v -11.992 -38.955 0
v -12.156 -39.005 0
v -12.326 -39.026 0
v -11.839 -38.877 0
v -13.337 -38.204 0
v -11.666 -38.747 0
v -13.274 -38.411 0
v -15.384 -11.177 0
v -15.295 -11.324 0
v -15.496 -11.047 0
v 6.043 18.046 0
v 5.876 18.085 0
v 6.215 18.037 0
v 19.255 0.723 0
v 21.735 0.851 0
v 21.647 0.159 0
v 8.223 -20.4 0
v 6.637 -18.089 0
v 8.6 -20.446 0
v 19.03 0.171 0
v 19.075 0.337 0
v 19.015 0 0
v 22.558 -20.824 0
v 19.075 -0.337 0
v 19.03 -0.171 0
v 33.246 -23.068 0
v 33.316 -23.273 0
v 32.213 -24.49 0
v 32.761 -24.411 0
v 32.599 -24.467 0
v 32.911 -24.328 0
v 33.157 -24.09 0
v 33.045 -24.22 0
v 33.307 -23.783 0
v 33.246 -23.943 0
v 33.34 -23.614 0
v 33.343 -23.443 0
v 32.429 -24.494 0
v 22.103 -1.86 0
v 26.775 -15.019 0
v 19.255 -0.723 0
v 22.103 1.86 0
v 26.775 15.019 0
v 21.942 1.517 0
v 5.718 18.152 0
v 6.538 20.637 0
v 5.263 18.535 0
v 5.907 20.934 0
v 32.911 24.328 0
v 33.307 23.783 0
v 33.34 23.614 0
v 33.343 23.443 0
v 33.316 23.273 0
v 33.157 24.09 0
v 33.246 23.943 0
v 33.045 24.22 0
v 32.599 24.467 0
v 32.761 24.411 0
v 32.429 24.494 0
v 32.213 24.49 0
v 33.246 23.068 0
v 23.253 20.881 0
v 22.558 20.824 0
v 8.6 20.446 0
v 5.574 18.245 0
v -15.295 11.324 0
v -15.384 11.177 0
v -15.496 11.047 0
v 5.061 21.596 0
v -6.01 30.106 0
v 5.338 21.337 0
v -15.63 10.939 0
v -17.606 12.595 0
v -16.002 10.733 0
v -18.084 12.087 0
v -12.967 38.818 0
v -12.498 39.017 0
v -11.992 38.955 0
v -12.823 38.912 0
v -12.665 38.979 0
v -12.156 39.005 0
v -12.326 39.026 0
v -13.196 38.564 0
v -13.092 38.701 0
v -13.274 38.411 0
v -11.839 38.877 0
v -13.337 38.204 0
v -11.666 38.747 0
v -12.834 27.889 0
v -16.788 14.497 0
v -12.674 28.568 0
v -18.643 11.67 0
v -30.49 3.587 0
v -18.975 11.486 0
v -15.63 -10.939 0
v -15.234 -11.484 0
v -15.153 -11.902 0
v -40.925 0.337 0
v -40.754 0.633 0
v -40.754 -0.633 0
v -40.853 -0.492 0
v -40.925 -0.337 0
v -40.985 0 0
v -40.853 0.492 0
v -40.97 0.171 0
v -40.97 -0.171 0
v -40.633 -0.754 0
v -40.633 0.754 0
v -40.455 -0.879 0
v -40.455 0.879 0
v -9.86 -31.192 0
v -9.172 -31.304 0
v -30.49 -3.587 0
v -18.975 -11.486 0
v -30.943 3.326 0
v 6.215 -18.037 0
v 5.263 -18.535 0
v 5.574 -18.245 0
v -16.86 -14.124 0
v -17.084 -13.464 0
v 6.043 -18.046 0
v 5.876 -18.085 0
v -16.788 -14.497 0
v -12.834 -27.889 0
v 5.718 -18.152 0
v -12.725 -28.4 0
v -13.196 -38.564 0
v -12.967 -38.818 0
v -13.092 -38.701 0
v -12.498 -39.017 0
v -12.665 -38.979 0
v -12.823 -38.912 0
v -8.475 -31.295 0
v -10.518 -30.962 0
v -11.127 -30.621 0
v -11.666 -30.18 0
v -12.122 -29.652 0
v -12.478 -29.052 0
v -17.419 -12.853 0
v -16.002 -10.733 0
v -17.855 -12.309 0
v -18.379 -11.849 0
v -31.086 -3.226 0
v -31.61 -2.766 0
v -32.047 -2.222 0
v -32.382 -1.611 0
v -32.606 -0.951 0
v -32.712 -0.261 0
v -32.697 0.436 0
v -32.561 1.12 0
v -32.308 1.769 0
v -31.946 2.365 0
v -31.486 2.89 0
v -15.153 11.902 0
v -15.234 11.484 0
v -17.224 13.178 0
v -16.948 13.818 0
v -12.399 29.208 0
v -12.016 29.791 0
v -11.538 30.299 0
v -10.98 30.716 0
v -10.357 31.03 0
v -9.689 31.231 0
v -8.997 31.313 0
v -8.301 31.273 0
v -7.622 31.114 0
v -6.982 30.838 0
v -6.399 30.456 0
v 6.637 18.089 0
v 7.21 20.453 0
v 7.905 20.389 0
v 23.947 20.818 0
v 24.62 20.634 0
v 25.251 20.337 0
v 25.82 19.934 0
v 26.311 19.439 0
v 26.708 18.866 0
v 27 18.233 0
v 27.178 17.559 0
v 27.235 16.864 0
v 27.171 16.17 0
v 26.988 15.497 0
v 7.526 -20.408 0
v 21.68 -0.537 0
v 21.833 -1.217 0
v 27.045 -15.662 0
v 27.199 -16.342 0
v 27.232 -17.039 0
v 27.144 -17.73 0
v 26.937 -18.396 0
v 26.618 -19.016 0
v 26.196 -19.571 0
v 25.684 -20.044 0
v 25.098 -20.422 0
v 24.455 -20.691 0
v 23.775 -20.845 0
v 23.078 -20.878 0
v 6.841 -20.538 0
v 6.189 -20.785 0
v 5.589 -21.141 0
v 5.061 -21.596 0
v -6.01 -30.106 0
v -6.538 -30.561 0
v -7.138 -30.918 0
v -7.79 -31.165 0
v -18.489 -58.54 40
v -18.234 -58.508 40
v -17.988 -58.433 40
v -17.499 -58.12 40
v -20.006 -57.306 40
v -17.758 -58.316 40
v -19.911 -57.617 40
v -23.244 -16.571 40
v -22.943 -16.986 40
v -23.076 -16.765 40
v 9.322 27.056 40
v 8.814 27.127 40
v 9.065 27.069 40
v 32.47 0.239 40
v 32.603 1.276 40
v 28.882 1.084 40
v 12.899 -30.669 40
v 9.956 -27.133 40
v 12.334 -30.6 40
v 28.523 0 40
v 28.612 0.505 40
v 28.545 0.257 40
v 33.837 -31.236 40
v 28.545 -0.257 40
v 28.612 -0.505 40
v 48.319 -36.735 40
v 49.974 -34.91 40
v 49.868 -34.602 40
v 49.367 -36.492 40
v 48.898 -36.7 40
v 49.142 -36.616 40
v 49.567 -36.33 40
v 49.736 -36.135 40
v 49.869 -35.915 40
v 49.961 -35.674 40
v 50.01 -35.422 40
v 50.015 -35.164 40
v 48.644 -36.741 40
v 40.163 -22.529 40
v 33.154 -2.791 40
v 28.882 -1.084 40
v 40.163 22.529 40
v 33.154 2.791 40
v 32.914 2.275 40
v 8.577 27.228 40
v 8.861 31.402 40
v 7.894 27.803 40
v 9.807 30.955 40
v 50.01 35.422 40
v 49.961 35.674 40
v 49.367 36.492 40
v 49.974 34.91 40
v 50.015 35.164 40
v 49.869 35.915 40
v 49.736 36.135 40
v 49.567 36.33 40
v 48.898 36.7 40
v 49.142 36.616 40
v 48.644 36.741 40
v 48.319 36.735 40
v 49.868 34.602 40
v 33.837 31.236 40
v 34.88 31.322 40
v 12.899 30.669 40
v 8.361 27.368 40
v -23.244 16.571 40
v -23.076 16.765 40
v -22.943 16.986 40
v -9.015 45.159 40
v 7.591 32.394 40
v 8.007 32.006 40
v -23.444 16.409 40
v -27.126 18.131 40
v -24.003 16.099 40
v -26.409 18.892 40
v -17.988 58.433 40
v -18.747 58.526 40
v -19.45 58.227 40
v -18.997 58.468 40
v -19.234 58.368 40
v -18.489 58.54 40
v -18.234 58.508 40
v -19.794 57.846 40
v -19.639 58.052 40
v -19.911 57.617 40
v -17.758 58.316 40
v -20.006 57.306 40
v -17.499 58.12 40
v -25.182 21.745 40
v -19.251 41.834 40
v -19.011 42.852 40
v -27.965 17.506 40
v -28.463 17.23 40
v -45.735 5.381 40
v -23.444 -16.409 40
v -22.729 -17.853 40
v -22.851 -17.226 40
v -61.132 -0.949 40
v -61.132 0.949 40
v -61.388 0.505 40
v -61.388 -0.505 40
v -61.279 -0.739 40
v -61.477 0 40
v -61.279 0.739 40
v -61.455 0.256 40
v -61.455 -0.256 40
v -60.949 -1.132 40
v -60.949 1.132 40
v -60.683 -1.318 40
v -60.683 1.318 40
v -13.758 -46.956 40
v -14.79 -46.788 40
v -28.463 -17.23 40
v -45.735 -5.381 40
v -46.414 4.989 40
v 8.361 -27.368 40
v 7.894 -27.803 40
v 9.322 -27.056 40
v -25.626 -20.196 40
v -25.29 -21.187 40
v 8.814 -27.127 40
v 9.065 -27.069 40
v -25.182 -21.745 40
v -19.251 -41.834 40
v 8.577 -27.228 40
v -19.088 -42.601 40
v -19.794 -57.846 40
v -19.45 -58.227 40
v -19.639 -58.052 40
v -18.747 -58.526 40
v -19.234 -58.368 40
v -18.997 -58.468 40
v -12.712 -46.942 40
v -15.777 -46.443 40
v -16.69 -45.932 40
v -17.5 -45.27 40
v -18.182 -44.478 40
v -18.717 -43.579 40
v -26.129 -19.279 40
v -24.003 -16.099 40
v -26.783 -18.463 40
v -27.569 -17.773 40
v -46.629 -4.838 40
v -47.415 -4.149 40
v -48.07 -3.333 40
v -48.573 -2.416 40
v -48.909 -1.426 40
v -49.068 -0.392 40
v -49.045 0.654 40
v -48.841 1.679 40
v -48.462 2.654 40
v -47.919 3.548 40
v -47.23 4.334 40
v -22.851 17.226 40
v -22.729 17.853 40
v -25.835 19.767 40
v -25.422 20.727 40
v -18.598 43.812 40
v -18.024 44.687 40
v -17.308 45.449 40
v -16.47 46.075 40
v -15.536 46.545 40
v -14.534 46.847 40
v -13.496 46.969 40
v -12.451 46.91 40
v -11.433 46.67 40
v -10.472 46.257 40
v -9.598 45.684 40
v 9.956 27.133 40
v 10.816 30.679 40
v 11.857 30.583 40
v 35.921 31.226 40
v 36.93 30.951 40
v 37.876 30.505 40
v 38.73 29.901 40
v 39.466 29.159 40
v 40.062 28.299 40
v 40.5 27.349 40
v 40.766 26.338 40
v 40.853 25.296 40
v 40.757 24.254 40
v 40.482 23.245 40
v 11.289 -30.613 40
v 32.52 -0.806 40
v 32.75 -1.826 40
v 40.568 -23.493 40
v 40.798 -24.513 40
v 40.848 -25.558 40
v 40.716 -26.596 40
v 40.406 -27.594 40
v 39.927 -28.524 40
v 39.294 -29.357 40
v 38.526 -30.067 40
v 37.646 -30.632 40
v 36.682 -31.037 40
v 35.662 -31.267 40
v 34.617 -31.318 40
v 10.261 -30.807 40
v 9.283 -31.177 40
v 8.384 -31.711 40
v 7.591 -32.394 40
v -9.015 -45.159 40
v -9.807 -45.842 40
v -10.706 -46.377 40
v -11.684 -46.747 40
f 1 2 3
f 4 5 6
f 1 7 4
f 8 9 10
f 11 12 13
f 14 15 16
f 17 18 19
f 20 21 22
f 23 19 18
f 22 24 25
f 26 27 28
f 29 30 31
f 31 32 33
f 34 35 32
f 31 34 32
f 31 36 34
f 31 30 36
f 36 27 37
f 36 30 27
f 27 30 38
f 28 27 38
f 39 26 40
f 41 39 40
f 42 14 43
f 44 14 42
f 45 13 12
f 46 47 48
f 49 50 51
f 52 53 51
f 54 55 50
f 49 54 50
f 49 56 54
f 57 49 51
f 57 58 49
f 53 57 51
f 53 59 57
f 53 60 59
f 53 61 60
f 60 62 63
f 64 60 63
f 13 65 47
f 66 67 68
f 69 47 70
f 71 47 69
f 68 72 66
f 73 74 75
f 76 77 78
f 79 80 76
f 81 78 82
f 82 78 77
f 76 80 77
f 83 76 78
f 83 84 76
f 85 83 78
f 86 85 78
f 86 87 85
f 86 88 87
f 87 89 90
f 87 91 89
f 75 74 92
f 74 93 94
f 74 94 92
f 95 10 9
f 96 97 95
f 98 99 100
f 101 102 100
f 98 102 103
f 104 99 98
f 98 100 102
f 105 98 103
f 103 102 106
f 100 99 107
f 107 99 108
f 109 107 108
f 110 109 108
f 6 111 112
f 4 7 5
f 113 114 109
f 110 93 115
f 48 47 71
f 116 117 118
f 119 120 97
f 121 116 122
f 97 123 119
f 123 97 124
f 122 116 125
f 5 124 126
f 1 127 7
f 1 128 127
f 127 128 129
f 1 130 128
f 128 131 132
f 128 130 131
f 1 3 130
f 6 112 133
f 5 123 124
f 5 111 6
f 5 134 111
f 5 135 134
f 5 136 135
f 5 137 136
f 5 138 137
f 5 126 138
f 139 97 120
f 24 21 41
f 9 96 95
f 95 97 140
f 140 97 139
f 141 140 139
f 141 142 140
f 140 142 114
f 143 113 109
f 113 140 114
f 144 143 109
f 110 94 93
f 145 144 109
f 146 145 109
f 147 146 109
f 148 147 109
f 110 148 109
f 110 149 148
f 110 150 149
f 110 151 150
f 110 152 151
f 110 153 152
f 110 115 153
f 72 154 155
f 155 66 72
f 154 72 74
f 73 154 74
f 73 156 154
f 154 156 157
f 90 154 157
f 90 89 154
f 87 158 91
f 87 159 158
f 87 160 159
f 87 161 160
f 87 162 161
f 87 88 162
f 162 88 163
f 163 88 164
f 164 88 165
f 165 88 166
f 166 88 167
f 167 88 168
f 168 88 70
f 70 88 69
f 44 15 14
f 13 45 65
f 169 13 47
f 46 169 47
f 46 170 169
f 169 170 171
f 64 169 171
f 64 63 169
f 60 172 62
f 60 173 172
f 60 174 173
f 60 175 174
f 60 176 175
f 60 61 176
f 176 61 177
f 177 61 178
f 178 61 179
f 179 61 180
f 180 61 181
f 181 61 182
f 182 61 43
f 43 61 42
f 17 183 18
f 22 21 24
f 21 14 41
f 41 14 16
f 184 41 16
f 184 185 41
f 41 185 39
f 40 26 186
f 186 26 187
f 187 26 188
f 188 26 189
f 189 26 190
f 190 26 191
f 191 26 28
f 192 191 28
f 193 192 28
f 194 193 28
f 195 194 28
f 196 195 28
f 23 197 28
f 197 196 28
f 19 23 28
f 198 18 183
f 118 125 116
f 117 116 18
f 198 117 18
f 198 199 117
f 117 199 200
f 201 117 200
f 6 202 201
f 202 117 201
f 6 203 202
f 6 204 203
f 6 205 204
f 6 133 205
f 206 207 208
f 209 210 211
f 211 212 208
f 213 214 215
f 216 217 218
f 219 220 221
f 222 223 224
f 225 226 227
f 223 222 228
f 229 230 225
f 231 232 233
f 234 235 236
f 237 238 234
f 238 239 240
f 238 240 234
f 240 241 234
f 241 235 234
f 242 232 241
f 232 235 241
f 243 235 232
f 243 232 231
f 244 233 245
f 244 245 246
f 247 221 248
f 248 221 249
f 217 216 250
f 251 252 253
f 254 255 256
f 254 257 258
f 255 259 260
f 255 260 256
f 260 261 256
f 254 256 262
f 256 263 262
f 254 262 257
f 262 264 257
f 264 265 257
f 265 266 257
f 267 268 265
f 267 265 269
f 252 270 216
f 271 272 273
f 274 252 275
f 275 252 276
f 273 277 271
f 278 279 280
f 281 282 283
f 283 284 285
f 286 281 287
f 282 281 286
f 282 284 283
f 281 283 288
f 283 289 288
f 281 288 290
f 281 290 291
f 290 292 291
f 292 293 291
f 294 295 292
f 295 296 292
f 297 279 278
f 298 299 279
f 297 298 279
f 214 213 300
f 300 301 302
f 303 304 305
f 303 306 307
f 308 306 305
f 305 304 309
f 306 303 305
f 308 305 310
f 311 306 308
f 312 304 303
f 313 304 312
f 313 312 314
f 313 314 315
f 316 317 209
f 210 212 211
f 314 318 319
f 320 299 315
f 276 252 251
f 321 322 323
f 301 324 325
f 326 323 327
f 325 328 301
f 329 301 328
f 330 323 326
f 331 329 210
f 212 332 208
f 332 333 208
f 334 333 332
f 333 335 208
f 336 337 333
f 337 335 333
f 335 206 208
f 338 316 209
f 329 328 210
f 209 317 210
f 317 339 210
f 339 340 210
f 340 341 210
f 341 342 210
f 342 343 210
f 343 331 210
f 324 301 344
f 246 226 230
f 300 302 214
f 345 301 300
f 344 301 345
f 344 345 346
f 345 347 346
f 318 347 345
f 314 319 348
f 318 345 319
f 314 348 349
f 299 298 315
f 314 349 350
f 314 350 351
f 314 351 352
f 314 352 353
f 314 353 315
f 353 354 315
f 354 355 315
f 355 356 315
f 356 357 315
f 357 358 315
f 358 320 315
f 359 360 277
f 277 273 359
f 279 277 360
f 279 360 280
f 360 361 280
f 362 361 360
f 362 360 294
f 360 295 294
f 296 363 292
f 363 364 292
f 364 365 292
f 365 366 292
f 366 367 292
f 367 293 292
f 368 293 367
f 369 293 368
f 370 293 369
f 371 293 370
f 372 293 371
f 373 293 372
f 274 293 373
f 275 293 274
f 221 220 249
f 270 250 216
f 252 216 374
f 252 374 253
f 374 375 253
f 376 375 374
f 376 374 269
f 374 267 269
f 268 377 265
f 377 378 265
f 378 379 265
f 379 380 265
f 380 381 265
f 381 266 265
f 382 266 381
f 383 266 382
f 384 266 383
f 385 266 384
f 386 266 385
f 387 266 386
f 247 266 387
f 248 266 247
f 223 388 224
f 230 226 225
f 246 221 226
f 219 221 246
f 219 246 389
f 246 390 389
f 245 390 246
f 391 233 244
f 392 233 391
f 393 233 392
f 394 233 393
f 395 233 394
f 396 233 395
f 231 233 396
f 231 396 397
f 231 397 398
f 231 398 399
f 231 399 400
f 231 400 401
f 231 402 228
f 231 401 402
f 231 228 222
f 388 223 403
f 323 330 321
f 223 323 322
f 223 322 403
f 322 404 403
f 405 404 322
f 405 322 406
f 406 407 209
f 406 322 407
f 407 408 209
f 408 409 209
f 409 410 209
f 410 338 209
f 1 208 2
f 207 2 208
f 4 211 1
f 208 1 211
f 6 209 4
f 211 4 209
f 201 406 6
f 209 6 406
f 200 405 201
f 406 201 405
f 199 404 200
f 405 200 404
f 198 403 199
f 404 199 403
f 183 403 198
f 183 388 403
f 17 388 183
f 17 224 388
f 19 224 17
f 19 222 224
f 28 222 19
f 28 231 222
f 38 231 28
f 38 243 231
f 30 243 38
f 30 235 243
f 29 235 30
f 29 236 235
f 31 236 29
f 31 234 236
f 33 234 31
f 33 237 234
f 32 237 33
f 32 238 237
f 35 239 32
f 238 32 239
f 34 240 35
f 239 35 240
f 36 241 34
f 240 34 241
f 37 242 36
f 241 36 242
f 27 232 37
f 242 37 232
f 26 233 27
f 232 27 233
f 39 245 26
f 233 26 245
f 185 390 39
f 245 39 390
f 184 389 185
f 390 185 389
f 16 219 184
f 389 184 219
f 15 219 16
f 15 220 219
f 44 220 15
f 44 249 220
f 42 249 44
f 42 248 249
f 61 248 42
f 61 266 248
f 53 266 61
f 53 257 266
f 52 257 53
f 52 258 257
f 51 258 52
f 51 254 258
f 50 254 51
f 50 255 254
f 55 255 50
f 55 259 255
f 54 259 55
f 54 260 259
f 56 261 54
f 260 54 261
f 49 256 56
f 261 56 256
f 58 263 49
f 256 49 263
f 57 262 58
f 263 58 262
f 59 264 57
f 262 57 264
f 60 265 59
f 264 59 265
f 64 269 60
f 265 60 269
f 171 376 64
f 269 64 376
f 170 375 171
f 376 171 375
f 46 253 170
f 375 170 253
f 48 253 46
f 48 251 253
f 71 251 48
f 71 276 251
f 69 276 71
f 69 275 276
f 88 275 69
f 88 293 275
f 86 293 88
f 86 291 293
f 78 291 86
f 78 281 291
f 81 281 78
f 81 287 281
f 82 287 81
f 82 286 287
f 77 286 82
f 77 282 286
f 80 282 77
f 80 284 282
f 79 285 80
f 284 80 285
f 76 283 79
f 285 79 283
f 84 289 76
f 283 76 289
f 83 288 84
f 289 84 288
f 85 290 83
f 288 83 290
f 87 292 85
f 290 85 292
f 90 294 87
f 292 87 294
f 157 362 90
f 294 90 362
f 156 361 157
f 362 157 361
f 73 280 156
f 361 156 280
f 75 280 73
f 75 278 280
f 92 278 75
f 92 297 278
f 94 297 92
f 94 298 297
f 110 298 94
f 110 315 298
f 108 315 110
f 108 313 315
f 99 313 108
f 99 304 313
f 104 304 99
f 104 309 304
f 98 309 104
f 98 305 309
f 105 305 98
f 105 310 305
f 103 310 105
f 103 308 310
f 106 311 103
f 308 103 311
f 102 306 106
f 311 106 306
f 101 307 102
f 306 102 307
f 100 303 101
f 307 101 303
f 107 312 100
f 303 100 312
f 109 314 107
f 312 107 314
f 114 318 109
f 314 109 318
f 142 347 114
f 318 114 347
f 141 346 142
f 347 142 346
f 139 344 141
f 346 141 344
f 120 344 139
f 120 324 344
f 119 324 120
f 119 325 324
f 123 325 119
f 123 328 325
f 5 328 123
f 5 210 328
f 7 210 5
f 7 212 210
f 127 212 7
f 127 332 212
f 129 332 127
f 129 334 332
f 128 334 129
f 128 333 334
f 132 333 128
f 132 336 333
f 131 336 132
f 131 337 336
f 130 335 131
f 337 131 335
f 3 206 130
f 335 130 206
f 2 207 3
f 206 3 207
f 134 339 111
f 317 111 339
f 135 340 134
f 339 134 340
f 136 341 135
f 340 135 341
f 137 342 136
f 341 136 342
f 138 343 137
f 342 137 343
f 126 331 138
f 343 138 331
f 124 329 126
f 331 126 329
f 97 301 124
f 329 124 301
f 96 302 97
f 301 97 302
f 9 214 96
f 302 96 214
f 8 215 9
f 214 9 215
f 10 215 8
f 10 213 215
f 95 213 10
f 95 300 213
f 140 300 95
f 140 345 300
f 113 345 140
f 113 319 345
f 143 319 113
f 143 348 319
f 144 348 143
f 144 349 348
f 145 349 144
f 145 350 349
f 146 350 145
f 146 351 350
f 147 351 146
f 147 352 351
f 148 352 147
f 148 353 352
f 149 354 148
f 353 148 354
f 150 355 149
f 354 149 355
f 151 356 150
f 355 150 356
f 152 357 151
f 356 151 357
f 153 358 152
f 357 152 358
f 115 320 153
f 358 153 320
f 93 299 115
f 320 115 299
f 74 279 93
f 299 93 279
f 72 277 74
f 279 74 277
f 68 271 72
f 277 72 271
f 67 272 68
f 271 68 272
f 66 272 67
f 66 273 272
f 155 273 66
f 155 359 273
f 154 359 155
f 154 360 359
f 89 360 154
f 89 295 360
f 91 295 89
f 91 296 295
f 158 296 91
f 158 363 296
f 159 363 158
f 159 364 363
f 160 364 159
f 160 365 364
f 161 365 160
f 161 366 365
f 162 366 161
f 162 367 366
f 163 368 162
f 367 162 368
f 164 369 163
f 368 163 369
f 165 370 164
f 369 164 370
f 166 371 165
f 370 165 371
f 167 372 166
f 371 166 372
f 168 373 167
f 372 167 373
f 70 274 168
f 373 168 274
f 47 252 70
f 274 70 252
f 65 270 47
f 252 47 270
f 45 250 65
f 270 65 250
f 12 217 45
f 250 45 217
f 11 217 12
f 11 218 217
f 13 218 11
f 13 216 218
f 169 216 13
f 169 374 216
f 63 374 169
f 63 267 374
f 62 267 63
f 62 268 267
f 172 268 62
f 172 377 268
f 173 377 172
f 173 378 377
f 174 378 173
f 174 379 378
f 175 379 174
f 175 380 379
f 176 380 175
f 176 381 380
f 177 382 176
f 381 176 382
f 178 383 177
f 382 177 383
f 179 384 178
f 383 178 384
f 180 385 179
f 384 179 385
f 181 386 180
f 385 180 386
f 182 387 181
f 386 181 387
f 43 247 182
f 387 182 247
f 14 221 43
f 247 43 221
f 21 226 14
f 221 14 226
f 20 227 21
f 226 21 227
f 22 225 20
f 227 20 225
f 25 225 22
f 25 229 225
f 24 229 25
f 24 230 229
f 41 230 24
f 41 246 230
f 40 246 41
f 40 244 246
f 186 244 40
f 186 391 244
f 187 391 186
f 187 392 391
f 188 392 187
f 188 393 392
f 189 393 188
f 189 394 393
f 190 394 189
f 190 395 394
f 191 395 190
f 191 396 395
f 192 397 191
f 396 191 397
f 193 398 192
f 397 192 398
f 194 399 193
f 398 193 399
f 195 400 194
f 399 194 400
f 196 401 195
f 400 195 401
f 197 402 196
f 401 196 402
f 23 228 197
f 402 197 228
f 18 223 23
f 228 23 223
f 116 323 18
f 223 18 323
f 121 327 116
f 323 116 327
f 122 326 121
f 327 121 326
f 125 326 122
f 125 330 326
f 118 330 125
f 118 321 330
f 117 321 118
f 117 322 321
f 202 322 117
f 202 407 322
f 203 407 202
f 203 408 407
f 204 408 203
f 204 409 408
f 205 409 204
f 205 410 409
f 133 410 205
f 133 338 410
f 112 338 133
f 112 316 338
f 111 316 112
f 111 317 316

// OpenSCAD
// Star-Maker by u/ardvarkmadman
// Star shaped holder for 40mm led Tea-Light
// https://www.reddit.com/r/openscad/comments/18f7hv3/star_shaped_holder_for_40mm_led_tealight_cic/

step=5;		//number of points
inner=40;	//inner diameter
outer=80;	//outer diameter
wide=10;	//width of line before offset applied
off=-4;		//offset applied to star - may be negative, if off < wide*2
ht=40;		//height parameter of linear_extrude
sc=1.5; 	//scale parameter of linear_extrude
$fn=36;		//resolution

color("bisque")
ring(sc);

module ring(sc){
	linear_extrude(ht,scale=sc)
		offset(off)
			profile();}

module profile(){
	for(i=[1:step]){
		hull(){ //right
			inner(i);
			outer(i);}
		hull(){ //left
			inner(i);
			outer(i-1);}}}
module inner(i){
	rotate(i*360/step)
		translate([inner/2,0])
			circle(wide/2);}
module outer(i){
	rotate(i*360/step+360/step/2)
		translate([outer/2,0])
			circle(wide/2);}

// Written in 2023 by u/ardvarkmadman
//
// To the extent possible under law, the author(s) have dedicated all
// copyright and related and neighboring rights to this software to the
// public domain worldwide. This software is distributed without any
// warranty.
//
// You should have received a copy of the CC0 Public Domain
// Dedication along with this software.
// If not, see <http://creativecommons.org/publicdomain/zero/1.0/>.
